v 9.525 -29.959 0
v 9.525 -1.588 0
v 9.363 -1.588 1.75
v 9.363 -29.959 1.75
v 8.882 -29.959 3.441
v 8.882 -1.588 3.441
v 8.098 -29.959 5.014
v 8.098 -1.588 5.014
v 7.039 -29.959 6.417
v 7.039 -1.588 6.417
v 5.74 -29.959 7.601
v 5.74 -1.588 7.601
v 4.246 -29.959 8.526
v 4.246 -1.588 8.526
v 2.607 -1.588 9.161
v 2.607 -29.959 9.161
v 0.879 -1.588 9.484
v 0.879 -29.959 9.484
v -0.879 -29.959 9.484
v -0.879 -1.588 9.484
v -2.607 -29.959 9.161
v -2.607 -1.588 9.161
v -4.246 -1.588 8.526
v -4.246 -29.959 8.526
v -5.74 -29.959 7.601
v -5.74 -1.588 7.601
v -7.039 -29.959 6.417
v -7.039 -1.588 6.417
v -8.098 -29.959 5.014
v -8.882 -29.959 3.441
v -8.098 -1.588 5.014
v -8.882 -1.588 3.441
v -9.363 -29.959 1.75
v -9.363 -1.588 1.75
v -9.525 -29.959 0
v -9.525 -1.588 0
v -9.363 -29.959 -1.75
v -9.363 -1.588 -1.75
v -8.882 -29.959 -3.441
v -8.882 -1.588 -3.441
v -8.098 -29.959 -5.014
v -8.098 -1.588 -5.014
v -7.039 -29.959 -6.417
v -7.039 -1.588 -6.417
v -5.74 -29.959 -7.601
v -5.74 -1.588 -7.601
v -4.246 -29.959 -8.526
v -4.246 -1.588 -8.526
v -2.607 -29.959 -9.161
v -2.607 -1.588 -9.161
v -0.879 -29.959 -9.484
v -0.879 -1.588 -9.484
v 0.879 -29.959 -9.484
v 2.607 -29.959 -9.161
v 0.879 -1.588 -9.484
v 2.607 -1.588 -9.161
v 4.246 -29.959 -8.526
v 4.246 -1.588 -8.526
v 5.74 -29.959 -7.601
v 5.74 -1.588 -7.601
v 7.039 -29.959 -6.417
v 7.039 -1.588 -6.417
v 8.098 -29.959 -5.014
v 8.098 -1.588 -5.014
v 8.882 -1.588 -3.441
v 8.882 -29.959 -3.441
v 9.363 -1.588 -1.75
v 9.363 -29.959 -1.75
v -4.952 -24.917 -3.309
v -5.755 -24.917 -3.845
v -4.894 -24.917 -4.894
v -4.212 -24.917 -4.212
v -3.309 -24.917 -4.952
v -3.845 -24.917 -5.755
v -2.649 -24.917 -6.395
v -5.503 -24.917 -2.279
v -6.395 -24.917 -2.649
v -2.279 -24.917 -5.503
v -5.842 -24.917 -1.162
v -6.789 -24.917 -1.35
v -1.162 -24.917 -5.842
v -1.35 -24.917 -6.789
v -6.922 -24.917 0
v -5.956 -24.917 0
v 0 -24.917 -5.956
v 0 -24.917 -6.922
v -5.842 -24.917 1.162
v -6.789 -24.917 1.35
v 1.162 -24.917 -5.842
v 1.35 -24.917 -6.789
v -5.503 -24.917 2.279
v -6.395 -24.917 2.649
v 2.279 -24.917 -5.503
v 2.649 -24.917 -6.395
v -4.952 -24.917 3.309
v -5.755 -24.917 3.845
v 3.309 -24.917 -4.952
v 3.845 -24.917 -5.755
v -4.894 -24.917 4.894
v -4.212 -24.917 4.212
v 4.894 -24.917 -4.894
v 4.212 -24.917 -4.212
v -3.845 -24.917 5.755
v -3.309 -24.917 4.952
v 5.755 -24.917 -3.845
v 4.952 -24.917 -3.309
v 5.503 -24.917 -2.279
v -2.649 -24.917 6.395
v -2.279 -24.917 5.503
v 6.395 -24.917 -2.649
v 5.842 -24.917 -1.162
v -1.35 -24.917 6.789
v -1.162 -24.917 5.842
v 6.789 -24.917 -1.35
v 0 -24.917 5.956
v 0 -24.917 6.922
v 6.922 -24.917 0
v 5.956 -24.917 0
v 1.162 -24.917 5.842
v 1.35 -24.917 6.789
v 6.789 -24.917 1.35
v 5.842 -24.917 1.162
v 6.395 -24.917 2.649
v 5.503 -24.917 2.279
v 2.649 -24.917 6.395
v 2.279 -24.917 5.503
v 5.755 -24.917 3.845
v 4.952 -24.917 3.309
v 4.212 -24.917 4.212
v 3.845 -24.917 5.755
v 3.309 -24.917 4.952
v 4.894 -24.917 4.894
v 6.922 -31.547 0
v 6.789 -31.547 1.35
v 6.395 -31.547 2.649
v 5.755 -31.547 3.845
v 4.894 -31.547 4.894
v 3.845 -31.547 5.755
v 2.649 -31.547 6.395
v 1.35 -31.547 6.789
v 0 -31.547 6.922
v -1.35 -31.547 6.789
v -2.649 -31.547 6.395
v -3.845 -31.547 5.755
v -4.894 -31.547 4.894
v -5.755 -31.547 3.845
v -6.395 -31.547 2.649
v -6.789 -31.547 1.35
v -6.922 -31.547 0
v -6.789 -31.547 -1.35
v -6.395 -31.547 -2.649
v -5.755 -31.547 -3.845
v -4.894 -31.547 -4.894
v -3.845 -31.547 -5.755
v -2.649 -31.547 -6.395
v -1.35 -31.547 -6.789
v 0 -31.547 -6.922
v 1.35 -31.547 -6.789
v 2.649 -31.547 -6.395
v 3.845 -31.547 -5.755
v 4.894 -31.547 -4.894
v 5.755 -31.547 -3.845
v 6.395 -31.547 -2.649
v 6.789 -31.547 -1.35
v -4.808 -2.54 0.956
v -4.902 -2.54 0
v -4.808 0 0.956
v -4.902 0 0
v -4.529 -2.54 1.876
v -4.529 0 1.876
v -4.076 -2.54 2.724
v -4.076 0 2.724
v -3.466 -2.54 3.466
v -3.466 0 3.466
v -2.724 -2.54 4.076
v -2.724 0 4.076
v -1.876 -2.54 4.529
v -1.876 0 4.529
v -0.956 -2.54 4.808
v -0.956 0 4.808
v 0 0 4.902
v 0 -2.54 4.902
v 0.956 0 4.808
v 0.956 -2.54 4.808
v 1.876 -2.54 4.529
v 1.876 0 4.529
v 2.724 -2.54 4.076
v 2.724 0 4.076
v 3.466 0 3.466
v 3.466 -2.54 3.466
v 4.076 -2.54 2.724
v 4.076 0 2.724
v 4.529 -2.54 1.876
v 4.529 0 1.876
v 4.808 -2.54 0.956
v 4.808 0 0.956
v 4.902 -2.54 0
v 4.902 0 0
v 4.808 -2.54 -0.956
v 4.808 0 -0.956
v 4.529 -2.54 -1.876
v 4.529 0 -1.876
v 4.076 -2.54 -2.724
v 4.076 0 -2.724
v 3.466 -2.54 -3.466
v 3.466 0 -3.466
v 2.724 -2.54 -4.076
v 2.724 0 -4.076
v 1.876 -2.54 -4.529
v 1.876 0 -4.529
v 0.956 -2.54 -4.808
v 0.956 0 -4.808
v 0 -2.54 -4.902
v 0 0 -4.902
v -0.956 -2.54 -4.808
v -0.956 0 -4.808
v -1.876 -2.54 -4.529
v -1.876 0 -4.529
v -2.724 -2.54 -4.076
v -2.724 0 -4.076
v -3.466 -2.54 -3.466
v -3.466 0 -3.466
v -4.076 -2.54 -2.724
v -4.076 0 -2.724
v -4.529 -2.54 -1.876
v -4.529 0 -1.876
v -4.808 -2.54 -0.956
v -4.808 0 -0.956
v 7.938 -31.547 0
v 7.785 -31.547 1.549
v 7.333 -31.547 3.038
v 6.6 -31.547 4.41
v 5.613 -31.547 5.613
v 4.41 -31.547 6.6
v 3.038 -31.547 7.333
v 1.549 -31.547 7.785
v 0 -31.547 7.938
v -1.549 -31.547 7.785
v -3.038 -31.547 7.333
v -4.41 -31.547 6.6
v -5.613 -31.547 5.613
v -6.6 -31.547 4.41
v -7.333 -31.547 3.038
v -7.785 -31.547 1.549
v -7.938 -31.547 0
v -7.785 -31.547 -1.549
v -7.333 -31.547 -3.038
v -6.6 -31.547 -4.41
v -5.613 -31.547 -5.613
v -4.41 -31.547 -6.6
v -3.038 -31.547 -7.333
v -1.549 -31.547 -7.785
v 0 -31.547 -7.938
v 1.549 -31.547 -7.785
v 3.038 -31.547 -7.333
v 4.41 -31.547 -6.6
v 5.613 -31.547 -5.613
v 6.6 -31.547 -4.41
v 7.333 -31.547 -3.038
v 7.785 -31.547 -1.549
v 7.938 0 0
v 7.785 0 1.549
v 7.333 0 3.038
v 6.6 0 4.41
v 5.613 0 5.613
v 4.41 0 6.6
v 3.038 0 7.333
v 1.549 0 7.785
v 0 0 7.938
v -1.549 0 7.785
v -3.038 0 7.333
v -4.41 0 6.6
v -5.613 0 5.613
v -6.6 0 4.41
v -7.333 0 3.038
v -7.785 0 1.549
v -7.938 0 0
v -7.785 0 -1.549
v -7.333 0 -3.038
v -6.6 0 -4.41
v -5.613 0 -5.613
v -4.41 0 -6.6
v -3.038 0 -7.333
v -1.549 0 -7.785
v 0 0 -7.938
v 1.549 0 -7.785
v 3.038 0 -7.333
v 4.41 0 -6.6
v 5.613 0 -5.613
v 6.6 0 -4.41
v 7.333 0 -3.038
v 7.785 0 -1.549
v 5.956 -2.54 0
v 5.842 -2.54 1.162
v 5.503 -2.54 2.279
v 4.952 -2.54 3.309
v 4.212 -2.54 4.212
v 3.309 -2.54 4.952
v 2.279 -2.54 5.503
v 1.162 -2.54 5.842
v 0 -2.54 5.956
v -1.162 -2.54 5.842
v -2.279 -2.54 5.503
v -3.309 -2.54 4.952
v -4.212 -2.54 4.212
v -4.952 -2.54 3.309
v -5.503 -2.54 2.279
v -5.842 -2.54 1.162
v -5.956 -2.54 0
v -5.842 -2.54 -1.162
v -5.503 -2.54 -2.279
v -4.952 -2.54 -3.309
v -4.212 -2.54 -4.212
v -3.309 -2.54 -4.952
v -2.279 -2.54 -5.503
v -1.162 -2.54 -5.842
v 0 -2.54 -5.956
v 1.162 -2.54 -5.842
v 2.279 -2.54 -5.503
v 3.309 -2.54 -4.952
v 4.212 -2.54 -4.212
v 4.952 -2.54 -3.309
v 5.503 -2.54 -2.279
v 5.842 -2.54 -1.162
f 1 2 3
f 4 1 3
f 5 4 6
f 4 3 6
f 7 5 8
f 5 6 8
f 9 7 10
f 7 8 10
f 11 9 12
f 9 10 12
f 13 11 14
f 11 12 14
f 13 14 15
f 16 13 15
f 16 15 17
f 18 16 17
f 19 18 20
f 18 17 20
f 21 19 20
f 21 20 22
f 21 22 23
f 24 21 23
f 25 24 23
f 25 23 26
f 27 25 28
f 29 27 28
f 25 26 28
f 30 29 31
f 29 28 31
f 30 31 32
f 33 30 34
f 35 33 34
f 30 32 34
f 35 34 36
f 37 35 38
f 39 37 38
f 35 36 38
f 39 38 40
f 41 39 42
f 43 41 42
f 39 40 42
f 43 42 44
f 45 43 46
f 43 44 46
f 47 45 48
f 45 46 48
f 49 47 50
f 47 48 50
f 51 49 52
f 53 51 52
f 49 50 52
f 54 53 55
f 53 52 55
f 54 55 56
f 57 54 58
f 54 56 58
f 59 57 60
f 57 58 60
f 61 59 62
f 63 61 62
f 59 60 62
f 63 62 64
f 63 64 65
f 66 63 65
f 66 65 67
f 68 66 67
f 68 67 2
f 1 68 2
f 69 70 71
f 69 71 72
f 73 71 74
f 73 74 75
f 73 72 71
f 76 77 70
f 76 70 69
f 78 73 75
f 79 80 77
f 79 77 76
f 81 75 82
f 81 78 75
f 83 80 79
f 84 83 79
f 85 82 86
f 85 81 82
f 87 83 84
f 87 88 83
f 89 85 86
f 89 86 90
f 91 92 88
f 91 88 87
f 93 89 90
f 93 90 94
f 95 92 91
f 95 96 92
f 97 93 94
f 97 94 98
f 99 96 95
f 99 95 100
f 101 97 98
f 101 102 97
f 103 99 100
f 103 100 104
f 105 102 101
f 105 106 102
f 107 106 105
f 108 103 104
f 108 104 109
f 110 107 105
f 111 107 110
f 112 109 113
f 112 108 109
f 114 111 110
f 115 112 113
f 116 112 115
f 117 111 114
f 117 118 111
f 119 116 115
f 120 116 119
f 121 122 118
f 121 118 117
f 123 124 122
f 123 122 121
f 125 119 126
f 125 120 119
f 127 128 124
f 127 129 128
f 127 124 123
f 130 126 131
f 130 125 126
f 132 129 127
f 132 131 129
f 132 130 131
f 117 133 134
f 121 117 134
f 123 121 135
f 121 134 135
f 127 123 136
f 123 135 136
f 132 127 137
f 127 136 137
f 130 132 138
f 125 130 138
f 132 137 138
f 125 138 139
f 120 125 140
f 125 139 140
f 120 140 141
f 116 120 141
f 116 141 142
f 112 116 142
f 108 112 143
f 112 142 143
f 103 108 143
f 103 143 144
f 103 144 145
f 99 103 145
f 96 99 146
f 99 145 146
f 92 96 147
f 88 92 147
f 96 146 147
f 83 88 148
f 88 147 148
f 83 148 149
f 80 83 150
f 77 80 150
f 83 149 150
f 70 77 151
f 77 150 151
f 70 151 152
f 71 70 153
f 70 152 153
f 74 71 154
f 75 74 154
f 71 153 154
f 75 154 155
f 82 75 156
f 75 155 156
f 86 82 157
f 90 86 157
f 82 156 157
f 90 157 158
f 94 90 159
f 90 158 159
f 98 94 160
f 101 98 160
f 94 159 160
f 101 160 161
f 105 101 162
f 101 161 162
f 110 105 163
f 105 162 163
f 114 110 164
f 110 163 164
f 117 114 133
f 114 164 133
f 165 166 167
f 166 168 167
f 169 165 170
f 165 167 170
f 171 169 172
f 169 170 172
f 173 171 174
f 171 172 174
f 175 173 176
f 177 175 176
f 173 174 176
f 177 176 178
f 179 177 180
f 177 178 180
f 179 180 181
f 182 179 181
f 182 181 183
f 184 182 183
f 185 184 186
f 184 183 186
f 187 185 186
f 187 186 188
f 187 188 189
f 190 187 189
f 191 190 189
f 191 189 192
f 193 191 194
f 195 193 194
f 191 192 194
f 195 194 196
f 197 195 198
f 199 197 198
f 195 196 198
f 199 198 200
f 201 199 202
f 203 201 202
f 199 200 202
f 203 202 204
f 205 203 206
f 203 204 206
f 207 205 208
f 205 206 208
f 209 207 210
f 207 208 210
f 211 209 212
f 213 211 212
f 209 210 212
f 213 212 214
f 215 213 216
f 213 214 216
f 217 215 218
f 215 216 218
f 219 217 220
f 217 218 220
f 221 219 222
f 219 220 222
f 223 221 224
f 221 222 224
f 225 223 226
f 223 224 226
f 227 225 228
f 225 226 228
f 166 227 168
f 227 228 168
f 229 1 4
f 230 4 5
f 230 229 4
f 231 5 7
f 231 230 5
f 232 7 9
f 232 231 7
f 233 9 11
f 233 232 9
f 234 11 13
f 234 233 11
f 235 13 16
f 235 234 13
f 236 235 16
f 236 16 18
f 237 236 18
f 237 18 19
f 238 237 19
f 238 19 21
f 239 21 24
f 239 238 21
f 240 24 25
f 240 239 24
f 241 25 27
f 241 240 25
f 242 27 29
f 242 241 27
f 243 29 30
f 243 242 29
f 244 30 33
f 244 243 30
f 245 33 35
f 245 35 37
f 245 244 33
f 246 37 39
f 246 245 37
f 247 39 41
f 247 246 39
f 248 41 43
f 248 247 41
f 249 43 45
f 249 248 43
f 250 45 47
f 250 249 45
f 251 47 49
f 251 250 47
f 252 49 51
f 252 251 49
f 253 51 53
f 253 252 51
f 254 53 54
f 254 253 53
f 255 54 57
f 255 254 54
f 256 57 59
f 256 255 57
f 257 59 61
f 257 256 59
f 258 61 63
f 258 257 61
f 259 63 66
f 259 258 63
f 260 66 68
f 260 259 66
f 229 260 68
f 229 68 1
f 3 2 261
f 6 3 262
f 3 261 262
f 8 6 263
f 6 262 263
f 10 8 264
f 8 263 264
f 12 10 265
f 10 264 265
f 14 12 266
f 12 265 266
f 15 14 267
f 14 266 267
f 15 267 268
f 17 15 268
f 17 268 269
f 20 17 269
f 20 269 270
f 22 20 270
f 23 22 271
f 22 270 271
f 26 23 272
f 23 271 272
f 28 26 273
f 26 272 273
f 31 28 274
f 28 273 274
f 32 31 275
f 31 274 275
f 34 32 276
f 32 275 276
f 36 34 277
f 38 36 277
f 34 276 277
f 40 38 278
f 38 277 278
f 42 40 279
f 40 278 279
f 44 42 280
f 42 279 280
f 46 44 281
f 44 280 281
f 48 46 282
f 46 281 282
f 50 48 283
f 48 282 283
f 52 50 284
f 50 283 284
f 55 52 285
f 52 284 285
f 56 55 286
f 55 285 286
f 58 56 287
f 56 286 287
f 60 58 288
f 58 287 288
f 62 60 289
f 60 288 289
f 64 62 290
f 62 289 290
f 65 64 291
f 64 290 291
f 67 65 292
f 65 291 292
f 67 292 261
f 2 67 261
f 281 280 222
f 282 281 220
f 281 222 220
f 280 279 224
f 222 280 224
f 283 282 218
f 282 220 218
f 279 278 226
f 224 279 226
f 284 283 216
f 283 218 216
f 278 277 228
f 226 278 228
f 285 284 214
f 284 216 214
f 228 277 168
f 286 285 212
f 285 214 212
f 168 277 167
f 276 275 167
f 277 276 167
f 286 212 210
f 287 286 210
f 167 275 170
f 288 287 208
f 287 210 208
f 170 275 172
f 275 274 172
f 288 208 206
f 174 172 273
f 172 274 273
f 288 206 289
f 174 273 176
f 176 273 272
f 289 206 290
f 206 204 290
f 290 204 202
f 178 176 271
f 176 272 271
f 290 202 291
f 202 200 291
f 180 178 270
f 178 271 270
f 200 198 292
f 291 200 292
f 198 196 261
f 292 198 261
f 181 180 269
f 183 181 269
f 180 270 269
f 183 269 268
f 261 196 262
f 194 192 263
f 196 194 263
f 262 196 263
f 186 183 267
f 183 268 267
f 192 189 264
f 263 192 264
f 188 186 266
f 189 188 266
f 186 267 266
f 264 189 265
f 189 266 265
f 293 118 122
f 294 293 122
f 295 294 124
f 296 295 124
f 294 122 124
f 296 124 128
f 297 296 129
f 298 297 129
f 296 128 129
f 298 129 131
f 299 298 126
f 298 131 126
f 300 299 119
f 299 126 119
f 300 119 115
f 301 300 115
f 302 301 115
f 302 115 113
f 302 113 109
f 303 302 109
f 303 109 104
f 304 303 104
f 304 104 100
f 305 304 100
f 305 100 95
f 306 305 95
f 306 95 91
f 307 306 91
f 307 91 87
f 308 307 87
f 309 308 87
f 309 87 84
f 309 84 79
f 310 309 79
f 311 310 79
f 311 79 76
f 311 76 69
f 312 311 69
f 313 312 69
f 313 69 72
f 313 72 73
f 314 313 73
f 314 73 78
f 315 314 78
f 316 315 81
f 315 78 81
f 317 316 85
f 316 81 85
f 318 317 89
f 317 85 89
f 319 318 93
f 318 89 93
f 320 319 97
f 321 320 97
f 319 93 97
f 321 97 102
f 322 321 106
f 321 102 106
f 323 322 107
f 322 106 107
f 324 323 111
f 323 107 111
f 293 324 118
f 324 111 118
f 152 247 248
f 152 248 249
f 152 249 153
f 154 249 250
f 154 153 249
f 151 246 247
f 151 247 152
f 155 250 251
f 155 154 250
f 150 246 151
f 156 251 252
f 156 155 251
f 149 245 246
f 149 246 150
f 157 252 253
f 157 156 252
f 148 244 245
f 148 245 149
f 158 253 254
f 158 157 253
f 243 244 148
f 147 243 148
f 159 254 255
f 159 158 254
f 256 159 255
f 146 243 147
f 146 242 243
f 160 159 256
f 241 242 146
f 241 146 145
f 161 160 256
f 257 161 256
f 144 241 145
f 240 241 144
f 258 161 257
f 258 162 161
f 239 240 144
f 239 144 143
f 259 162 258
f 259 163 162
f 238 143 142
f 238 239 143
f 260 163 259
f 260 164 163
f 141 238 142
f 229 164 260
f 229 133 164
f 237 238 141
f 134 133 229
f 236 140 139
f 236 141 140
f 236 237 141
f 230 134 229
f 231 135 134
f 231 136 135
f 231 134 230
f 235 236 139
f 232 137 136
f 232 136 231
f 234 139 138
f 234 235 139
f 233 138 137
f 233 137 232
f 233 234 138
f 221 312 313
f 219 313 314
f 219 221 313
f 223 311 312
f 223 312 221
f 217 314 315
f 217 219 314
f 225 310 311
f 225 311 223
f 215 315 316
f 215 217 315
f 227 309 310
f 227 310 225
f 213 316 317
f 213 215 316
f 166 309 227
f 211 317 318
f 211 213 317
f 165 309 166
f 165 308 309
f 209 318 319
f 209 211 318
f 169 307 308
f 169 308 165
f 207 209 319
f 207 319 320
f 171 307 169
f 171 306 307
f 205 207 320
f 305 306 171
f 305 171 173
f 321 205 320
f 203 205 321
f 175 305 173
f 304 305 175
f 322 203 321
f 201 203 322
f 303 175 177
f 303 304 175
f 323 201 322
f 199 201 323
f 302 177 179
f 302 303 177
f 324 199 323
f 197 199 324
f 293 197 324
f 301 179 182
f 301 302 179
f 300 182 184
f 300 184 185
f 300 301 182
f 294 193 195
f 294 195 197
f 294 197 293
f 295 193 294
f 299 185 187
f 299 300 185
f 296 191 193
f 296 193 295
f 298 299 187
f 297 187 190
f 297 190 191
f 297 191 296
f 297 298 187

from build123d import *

# Parameters (mm, degrees)
F0_R           = 9.525
F1_DEPTH       = 31.5468
F3_D           = 9.8044
F3_CBORE_D     = 11.9126
F3_CBORE_DEPTH = 29.0068
F4_R           = 6.9215
F5_DEPTH       = 6.6294
F6_SIZE2       = 1.5875
F6_SIZE        = 1.5875


with BuildPart() as f1:
    # F0 (on Front) → F1 (new body)
    with BuildSketch(Plane.XZ):
        Circle(F0_R)
    extrude(amount=F1_DEPTH)

    # F3 (through all)
    with Locations(Plane.XZ.offset(31.5468)):
        with Locations((0, 0)):
            CounterBoreHole(F3_D / 2, F3_CBORE_D / 2, F3_CBORE_DEPTH)

    # F4 (on face) → F5 (cut)
    with BuildSketch(Plane.XZ.offset(31.5468)):
        Circle(F4_R)
    extrude(amount=-F5_DEPTH, mode=Mode.SUBTRACT)

    # F6
    f6_edges = [f1.edges().sort_by_distance(p)[0] for p in [
        (-9.525, -31.5468, 0),
        (-9.525, 0, 0),
    ]]
    chamfer(f6_edges, length=F6_SIZE, length2=F6_SIZE2)


solid = f1.part
